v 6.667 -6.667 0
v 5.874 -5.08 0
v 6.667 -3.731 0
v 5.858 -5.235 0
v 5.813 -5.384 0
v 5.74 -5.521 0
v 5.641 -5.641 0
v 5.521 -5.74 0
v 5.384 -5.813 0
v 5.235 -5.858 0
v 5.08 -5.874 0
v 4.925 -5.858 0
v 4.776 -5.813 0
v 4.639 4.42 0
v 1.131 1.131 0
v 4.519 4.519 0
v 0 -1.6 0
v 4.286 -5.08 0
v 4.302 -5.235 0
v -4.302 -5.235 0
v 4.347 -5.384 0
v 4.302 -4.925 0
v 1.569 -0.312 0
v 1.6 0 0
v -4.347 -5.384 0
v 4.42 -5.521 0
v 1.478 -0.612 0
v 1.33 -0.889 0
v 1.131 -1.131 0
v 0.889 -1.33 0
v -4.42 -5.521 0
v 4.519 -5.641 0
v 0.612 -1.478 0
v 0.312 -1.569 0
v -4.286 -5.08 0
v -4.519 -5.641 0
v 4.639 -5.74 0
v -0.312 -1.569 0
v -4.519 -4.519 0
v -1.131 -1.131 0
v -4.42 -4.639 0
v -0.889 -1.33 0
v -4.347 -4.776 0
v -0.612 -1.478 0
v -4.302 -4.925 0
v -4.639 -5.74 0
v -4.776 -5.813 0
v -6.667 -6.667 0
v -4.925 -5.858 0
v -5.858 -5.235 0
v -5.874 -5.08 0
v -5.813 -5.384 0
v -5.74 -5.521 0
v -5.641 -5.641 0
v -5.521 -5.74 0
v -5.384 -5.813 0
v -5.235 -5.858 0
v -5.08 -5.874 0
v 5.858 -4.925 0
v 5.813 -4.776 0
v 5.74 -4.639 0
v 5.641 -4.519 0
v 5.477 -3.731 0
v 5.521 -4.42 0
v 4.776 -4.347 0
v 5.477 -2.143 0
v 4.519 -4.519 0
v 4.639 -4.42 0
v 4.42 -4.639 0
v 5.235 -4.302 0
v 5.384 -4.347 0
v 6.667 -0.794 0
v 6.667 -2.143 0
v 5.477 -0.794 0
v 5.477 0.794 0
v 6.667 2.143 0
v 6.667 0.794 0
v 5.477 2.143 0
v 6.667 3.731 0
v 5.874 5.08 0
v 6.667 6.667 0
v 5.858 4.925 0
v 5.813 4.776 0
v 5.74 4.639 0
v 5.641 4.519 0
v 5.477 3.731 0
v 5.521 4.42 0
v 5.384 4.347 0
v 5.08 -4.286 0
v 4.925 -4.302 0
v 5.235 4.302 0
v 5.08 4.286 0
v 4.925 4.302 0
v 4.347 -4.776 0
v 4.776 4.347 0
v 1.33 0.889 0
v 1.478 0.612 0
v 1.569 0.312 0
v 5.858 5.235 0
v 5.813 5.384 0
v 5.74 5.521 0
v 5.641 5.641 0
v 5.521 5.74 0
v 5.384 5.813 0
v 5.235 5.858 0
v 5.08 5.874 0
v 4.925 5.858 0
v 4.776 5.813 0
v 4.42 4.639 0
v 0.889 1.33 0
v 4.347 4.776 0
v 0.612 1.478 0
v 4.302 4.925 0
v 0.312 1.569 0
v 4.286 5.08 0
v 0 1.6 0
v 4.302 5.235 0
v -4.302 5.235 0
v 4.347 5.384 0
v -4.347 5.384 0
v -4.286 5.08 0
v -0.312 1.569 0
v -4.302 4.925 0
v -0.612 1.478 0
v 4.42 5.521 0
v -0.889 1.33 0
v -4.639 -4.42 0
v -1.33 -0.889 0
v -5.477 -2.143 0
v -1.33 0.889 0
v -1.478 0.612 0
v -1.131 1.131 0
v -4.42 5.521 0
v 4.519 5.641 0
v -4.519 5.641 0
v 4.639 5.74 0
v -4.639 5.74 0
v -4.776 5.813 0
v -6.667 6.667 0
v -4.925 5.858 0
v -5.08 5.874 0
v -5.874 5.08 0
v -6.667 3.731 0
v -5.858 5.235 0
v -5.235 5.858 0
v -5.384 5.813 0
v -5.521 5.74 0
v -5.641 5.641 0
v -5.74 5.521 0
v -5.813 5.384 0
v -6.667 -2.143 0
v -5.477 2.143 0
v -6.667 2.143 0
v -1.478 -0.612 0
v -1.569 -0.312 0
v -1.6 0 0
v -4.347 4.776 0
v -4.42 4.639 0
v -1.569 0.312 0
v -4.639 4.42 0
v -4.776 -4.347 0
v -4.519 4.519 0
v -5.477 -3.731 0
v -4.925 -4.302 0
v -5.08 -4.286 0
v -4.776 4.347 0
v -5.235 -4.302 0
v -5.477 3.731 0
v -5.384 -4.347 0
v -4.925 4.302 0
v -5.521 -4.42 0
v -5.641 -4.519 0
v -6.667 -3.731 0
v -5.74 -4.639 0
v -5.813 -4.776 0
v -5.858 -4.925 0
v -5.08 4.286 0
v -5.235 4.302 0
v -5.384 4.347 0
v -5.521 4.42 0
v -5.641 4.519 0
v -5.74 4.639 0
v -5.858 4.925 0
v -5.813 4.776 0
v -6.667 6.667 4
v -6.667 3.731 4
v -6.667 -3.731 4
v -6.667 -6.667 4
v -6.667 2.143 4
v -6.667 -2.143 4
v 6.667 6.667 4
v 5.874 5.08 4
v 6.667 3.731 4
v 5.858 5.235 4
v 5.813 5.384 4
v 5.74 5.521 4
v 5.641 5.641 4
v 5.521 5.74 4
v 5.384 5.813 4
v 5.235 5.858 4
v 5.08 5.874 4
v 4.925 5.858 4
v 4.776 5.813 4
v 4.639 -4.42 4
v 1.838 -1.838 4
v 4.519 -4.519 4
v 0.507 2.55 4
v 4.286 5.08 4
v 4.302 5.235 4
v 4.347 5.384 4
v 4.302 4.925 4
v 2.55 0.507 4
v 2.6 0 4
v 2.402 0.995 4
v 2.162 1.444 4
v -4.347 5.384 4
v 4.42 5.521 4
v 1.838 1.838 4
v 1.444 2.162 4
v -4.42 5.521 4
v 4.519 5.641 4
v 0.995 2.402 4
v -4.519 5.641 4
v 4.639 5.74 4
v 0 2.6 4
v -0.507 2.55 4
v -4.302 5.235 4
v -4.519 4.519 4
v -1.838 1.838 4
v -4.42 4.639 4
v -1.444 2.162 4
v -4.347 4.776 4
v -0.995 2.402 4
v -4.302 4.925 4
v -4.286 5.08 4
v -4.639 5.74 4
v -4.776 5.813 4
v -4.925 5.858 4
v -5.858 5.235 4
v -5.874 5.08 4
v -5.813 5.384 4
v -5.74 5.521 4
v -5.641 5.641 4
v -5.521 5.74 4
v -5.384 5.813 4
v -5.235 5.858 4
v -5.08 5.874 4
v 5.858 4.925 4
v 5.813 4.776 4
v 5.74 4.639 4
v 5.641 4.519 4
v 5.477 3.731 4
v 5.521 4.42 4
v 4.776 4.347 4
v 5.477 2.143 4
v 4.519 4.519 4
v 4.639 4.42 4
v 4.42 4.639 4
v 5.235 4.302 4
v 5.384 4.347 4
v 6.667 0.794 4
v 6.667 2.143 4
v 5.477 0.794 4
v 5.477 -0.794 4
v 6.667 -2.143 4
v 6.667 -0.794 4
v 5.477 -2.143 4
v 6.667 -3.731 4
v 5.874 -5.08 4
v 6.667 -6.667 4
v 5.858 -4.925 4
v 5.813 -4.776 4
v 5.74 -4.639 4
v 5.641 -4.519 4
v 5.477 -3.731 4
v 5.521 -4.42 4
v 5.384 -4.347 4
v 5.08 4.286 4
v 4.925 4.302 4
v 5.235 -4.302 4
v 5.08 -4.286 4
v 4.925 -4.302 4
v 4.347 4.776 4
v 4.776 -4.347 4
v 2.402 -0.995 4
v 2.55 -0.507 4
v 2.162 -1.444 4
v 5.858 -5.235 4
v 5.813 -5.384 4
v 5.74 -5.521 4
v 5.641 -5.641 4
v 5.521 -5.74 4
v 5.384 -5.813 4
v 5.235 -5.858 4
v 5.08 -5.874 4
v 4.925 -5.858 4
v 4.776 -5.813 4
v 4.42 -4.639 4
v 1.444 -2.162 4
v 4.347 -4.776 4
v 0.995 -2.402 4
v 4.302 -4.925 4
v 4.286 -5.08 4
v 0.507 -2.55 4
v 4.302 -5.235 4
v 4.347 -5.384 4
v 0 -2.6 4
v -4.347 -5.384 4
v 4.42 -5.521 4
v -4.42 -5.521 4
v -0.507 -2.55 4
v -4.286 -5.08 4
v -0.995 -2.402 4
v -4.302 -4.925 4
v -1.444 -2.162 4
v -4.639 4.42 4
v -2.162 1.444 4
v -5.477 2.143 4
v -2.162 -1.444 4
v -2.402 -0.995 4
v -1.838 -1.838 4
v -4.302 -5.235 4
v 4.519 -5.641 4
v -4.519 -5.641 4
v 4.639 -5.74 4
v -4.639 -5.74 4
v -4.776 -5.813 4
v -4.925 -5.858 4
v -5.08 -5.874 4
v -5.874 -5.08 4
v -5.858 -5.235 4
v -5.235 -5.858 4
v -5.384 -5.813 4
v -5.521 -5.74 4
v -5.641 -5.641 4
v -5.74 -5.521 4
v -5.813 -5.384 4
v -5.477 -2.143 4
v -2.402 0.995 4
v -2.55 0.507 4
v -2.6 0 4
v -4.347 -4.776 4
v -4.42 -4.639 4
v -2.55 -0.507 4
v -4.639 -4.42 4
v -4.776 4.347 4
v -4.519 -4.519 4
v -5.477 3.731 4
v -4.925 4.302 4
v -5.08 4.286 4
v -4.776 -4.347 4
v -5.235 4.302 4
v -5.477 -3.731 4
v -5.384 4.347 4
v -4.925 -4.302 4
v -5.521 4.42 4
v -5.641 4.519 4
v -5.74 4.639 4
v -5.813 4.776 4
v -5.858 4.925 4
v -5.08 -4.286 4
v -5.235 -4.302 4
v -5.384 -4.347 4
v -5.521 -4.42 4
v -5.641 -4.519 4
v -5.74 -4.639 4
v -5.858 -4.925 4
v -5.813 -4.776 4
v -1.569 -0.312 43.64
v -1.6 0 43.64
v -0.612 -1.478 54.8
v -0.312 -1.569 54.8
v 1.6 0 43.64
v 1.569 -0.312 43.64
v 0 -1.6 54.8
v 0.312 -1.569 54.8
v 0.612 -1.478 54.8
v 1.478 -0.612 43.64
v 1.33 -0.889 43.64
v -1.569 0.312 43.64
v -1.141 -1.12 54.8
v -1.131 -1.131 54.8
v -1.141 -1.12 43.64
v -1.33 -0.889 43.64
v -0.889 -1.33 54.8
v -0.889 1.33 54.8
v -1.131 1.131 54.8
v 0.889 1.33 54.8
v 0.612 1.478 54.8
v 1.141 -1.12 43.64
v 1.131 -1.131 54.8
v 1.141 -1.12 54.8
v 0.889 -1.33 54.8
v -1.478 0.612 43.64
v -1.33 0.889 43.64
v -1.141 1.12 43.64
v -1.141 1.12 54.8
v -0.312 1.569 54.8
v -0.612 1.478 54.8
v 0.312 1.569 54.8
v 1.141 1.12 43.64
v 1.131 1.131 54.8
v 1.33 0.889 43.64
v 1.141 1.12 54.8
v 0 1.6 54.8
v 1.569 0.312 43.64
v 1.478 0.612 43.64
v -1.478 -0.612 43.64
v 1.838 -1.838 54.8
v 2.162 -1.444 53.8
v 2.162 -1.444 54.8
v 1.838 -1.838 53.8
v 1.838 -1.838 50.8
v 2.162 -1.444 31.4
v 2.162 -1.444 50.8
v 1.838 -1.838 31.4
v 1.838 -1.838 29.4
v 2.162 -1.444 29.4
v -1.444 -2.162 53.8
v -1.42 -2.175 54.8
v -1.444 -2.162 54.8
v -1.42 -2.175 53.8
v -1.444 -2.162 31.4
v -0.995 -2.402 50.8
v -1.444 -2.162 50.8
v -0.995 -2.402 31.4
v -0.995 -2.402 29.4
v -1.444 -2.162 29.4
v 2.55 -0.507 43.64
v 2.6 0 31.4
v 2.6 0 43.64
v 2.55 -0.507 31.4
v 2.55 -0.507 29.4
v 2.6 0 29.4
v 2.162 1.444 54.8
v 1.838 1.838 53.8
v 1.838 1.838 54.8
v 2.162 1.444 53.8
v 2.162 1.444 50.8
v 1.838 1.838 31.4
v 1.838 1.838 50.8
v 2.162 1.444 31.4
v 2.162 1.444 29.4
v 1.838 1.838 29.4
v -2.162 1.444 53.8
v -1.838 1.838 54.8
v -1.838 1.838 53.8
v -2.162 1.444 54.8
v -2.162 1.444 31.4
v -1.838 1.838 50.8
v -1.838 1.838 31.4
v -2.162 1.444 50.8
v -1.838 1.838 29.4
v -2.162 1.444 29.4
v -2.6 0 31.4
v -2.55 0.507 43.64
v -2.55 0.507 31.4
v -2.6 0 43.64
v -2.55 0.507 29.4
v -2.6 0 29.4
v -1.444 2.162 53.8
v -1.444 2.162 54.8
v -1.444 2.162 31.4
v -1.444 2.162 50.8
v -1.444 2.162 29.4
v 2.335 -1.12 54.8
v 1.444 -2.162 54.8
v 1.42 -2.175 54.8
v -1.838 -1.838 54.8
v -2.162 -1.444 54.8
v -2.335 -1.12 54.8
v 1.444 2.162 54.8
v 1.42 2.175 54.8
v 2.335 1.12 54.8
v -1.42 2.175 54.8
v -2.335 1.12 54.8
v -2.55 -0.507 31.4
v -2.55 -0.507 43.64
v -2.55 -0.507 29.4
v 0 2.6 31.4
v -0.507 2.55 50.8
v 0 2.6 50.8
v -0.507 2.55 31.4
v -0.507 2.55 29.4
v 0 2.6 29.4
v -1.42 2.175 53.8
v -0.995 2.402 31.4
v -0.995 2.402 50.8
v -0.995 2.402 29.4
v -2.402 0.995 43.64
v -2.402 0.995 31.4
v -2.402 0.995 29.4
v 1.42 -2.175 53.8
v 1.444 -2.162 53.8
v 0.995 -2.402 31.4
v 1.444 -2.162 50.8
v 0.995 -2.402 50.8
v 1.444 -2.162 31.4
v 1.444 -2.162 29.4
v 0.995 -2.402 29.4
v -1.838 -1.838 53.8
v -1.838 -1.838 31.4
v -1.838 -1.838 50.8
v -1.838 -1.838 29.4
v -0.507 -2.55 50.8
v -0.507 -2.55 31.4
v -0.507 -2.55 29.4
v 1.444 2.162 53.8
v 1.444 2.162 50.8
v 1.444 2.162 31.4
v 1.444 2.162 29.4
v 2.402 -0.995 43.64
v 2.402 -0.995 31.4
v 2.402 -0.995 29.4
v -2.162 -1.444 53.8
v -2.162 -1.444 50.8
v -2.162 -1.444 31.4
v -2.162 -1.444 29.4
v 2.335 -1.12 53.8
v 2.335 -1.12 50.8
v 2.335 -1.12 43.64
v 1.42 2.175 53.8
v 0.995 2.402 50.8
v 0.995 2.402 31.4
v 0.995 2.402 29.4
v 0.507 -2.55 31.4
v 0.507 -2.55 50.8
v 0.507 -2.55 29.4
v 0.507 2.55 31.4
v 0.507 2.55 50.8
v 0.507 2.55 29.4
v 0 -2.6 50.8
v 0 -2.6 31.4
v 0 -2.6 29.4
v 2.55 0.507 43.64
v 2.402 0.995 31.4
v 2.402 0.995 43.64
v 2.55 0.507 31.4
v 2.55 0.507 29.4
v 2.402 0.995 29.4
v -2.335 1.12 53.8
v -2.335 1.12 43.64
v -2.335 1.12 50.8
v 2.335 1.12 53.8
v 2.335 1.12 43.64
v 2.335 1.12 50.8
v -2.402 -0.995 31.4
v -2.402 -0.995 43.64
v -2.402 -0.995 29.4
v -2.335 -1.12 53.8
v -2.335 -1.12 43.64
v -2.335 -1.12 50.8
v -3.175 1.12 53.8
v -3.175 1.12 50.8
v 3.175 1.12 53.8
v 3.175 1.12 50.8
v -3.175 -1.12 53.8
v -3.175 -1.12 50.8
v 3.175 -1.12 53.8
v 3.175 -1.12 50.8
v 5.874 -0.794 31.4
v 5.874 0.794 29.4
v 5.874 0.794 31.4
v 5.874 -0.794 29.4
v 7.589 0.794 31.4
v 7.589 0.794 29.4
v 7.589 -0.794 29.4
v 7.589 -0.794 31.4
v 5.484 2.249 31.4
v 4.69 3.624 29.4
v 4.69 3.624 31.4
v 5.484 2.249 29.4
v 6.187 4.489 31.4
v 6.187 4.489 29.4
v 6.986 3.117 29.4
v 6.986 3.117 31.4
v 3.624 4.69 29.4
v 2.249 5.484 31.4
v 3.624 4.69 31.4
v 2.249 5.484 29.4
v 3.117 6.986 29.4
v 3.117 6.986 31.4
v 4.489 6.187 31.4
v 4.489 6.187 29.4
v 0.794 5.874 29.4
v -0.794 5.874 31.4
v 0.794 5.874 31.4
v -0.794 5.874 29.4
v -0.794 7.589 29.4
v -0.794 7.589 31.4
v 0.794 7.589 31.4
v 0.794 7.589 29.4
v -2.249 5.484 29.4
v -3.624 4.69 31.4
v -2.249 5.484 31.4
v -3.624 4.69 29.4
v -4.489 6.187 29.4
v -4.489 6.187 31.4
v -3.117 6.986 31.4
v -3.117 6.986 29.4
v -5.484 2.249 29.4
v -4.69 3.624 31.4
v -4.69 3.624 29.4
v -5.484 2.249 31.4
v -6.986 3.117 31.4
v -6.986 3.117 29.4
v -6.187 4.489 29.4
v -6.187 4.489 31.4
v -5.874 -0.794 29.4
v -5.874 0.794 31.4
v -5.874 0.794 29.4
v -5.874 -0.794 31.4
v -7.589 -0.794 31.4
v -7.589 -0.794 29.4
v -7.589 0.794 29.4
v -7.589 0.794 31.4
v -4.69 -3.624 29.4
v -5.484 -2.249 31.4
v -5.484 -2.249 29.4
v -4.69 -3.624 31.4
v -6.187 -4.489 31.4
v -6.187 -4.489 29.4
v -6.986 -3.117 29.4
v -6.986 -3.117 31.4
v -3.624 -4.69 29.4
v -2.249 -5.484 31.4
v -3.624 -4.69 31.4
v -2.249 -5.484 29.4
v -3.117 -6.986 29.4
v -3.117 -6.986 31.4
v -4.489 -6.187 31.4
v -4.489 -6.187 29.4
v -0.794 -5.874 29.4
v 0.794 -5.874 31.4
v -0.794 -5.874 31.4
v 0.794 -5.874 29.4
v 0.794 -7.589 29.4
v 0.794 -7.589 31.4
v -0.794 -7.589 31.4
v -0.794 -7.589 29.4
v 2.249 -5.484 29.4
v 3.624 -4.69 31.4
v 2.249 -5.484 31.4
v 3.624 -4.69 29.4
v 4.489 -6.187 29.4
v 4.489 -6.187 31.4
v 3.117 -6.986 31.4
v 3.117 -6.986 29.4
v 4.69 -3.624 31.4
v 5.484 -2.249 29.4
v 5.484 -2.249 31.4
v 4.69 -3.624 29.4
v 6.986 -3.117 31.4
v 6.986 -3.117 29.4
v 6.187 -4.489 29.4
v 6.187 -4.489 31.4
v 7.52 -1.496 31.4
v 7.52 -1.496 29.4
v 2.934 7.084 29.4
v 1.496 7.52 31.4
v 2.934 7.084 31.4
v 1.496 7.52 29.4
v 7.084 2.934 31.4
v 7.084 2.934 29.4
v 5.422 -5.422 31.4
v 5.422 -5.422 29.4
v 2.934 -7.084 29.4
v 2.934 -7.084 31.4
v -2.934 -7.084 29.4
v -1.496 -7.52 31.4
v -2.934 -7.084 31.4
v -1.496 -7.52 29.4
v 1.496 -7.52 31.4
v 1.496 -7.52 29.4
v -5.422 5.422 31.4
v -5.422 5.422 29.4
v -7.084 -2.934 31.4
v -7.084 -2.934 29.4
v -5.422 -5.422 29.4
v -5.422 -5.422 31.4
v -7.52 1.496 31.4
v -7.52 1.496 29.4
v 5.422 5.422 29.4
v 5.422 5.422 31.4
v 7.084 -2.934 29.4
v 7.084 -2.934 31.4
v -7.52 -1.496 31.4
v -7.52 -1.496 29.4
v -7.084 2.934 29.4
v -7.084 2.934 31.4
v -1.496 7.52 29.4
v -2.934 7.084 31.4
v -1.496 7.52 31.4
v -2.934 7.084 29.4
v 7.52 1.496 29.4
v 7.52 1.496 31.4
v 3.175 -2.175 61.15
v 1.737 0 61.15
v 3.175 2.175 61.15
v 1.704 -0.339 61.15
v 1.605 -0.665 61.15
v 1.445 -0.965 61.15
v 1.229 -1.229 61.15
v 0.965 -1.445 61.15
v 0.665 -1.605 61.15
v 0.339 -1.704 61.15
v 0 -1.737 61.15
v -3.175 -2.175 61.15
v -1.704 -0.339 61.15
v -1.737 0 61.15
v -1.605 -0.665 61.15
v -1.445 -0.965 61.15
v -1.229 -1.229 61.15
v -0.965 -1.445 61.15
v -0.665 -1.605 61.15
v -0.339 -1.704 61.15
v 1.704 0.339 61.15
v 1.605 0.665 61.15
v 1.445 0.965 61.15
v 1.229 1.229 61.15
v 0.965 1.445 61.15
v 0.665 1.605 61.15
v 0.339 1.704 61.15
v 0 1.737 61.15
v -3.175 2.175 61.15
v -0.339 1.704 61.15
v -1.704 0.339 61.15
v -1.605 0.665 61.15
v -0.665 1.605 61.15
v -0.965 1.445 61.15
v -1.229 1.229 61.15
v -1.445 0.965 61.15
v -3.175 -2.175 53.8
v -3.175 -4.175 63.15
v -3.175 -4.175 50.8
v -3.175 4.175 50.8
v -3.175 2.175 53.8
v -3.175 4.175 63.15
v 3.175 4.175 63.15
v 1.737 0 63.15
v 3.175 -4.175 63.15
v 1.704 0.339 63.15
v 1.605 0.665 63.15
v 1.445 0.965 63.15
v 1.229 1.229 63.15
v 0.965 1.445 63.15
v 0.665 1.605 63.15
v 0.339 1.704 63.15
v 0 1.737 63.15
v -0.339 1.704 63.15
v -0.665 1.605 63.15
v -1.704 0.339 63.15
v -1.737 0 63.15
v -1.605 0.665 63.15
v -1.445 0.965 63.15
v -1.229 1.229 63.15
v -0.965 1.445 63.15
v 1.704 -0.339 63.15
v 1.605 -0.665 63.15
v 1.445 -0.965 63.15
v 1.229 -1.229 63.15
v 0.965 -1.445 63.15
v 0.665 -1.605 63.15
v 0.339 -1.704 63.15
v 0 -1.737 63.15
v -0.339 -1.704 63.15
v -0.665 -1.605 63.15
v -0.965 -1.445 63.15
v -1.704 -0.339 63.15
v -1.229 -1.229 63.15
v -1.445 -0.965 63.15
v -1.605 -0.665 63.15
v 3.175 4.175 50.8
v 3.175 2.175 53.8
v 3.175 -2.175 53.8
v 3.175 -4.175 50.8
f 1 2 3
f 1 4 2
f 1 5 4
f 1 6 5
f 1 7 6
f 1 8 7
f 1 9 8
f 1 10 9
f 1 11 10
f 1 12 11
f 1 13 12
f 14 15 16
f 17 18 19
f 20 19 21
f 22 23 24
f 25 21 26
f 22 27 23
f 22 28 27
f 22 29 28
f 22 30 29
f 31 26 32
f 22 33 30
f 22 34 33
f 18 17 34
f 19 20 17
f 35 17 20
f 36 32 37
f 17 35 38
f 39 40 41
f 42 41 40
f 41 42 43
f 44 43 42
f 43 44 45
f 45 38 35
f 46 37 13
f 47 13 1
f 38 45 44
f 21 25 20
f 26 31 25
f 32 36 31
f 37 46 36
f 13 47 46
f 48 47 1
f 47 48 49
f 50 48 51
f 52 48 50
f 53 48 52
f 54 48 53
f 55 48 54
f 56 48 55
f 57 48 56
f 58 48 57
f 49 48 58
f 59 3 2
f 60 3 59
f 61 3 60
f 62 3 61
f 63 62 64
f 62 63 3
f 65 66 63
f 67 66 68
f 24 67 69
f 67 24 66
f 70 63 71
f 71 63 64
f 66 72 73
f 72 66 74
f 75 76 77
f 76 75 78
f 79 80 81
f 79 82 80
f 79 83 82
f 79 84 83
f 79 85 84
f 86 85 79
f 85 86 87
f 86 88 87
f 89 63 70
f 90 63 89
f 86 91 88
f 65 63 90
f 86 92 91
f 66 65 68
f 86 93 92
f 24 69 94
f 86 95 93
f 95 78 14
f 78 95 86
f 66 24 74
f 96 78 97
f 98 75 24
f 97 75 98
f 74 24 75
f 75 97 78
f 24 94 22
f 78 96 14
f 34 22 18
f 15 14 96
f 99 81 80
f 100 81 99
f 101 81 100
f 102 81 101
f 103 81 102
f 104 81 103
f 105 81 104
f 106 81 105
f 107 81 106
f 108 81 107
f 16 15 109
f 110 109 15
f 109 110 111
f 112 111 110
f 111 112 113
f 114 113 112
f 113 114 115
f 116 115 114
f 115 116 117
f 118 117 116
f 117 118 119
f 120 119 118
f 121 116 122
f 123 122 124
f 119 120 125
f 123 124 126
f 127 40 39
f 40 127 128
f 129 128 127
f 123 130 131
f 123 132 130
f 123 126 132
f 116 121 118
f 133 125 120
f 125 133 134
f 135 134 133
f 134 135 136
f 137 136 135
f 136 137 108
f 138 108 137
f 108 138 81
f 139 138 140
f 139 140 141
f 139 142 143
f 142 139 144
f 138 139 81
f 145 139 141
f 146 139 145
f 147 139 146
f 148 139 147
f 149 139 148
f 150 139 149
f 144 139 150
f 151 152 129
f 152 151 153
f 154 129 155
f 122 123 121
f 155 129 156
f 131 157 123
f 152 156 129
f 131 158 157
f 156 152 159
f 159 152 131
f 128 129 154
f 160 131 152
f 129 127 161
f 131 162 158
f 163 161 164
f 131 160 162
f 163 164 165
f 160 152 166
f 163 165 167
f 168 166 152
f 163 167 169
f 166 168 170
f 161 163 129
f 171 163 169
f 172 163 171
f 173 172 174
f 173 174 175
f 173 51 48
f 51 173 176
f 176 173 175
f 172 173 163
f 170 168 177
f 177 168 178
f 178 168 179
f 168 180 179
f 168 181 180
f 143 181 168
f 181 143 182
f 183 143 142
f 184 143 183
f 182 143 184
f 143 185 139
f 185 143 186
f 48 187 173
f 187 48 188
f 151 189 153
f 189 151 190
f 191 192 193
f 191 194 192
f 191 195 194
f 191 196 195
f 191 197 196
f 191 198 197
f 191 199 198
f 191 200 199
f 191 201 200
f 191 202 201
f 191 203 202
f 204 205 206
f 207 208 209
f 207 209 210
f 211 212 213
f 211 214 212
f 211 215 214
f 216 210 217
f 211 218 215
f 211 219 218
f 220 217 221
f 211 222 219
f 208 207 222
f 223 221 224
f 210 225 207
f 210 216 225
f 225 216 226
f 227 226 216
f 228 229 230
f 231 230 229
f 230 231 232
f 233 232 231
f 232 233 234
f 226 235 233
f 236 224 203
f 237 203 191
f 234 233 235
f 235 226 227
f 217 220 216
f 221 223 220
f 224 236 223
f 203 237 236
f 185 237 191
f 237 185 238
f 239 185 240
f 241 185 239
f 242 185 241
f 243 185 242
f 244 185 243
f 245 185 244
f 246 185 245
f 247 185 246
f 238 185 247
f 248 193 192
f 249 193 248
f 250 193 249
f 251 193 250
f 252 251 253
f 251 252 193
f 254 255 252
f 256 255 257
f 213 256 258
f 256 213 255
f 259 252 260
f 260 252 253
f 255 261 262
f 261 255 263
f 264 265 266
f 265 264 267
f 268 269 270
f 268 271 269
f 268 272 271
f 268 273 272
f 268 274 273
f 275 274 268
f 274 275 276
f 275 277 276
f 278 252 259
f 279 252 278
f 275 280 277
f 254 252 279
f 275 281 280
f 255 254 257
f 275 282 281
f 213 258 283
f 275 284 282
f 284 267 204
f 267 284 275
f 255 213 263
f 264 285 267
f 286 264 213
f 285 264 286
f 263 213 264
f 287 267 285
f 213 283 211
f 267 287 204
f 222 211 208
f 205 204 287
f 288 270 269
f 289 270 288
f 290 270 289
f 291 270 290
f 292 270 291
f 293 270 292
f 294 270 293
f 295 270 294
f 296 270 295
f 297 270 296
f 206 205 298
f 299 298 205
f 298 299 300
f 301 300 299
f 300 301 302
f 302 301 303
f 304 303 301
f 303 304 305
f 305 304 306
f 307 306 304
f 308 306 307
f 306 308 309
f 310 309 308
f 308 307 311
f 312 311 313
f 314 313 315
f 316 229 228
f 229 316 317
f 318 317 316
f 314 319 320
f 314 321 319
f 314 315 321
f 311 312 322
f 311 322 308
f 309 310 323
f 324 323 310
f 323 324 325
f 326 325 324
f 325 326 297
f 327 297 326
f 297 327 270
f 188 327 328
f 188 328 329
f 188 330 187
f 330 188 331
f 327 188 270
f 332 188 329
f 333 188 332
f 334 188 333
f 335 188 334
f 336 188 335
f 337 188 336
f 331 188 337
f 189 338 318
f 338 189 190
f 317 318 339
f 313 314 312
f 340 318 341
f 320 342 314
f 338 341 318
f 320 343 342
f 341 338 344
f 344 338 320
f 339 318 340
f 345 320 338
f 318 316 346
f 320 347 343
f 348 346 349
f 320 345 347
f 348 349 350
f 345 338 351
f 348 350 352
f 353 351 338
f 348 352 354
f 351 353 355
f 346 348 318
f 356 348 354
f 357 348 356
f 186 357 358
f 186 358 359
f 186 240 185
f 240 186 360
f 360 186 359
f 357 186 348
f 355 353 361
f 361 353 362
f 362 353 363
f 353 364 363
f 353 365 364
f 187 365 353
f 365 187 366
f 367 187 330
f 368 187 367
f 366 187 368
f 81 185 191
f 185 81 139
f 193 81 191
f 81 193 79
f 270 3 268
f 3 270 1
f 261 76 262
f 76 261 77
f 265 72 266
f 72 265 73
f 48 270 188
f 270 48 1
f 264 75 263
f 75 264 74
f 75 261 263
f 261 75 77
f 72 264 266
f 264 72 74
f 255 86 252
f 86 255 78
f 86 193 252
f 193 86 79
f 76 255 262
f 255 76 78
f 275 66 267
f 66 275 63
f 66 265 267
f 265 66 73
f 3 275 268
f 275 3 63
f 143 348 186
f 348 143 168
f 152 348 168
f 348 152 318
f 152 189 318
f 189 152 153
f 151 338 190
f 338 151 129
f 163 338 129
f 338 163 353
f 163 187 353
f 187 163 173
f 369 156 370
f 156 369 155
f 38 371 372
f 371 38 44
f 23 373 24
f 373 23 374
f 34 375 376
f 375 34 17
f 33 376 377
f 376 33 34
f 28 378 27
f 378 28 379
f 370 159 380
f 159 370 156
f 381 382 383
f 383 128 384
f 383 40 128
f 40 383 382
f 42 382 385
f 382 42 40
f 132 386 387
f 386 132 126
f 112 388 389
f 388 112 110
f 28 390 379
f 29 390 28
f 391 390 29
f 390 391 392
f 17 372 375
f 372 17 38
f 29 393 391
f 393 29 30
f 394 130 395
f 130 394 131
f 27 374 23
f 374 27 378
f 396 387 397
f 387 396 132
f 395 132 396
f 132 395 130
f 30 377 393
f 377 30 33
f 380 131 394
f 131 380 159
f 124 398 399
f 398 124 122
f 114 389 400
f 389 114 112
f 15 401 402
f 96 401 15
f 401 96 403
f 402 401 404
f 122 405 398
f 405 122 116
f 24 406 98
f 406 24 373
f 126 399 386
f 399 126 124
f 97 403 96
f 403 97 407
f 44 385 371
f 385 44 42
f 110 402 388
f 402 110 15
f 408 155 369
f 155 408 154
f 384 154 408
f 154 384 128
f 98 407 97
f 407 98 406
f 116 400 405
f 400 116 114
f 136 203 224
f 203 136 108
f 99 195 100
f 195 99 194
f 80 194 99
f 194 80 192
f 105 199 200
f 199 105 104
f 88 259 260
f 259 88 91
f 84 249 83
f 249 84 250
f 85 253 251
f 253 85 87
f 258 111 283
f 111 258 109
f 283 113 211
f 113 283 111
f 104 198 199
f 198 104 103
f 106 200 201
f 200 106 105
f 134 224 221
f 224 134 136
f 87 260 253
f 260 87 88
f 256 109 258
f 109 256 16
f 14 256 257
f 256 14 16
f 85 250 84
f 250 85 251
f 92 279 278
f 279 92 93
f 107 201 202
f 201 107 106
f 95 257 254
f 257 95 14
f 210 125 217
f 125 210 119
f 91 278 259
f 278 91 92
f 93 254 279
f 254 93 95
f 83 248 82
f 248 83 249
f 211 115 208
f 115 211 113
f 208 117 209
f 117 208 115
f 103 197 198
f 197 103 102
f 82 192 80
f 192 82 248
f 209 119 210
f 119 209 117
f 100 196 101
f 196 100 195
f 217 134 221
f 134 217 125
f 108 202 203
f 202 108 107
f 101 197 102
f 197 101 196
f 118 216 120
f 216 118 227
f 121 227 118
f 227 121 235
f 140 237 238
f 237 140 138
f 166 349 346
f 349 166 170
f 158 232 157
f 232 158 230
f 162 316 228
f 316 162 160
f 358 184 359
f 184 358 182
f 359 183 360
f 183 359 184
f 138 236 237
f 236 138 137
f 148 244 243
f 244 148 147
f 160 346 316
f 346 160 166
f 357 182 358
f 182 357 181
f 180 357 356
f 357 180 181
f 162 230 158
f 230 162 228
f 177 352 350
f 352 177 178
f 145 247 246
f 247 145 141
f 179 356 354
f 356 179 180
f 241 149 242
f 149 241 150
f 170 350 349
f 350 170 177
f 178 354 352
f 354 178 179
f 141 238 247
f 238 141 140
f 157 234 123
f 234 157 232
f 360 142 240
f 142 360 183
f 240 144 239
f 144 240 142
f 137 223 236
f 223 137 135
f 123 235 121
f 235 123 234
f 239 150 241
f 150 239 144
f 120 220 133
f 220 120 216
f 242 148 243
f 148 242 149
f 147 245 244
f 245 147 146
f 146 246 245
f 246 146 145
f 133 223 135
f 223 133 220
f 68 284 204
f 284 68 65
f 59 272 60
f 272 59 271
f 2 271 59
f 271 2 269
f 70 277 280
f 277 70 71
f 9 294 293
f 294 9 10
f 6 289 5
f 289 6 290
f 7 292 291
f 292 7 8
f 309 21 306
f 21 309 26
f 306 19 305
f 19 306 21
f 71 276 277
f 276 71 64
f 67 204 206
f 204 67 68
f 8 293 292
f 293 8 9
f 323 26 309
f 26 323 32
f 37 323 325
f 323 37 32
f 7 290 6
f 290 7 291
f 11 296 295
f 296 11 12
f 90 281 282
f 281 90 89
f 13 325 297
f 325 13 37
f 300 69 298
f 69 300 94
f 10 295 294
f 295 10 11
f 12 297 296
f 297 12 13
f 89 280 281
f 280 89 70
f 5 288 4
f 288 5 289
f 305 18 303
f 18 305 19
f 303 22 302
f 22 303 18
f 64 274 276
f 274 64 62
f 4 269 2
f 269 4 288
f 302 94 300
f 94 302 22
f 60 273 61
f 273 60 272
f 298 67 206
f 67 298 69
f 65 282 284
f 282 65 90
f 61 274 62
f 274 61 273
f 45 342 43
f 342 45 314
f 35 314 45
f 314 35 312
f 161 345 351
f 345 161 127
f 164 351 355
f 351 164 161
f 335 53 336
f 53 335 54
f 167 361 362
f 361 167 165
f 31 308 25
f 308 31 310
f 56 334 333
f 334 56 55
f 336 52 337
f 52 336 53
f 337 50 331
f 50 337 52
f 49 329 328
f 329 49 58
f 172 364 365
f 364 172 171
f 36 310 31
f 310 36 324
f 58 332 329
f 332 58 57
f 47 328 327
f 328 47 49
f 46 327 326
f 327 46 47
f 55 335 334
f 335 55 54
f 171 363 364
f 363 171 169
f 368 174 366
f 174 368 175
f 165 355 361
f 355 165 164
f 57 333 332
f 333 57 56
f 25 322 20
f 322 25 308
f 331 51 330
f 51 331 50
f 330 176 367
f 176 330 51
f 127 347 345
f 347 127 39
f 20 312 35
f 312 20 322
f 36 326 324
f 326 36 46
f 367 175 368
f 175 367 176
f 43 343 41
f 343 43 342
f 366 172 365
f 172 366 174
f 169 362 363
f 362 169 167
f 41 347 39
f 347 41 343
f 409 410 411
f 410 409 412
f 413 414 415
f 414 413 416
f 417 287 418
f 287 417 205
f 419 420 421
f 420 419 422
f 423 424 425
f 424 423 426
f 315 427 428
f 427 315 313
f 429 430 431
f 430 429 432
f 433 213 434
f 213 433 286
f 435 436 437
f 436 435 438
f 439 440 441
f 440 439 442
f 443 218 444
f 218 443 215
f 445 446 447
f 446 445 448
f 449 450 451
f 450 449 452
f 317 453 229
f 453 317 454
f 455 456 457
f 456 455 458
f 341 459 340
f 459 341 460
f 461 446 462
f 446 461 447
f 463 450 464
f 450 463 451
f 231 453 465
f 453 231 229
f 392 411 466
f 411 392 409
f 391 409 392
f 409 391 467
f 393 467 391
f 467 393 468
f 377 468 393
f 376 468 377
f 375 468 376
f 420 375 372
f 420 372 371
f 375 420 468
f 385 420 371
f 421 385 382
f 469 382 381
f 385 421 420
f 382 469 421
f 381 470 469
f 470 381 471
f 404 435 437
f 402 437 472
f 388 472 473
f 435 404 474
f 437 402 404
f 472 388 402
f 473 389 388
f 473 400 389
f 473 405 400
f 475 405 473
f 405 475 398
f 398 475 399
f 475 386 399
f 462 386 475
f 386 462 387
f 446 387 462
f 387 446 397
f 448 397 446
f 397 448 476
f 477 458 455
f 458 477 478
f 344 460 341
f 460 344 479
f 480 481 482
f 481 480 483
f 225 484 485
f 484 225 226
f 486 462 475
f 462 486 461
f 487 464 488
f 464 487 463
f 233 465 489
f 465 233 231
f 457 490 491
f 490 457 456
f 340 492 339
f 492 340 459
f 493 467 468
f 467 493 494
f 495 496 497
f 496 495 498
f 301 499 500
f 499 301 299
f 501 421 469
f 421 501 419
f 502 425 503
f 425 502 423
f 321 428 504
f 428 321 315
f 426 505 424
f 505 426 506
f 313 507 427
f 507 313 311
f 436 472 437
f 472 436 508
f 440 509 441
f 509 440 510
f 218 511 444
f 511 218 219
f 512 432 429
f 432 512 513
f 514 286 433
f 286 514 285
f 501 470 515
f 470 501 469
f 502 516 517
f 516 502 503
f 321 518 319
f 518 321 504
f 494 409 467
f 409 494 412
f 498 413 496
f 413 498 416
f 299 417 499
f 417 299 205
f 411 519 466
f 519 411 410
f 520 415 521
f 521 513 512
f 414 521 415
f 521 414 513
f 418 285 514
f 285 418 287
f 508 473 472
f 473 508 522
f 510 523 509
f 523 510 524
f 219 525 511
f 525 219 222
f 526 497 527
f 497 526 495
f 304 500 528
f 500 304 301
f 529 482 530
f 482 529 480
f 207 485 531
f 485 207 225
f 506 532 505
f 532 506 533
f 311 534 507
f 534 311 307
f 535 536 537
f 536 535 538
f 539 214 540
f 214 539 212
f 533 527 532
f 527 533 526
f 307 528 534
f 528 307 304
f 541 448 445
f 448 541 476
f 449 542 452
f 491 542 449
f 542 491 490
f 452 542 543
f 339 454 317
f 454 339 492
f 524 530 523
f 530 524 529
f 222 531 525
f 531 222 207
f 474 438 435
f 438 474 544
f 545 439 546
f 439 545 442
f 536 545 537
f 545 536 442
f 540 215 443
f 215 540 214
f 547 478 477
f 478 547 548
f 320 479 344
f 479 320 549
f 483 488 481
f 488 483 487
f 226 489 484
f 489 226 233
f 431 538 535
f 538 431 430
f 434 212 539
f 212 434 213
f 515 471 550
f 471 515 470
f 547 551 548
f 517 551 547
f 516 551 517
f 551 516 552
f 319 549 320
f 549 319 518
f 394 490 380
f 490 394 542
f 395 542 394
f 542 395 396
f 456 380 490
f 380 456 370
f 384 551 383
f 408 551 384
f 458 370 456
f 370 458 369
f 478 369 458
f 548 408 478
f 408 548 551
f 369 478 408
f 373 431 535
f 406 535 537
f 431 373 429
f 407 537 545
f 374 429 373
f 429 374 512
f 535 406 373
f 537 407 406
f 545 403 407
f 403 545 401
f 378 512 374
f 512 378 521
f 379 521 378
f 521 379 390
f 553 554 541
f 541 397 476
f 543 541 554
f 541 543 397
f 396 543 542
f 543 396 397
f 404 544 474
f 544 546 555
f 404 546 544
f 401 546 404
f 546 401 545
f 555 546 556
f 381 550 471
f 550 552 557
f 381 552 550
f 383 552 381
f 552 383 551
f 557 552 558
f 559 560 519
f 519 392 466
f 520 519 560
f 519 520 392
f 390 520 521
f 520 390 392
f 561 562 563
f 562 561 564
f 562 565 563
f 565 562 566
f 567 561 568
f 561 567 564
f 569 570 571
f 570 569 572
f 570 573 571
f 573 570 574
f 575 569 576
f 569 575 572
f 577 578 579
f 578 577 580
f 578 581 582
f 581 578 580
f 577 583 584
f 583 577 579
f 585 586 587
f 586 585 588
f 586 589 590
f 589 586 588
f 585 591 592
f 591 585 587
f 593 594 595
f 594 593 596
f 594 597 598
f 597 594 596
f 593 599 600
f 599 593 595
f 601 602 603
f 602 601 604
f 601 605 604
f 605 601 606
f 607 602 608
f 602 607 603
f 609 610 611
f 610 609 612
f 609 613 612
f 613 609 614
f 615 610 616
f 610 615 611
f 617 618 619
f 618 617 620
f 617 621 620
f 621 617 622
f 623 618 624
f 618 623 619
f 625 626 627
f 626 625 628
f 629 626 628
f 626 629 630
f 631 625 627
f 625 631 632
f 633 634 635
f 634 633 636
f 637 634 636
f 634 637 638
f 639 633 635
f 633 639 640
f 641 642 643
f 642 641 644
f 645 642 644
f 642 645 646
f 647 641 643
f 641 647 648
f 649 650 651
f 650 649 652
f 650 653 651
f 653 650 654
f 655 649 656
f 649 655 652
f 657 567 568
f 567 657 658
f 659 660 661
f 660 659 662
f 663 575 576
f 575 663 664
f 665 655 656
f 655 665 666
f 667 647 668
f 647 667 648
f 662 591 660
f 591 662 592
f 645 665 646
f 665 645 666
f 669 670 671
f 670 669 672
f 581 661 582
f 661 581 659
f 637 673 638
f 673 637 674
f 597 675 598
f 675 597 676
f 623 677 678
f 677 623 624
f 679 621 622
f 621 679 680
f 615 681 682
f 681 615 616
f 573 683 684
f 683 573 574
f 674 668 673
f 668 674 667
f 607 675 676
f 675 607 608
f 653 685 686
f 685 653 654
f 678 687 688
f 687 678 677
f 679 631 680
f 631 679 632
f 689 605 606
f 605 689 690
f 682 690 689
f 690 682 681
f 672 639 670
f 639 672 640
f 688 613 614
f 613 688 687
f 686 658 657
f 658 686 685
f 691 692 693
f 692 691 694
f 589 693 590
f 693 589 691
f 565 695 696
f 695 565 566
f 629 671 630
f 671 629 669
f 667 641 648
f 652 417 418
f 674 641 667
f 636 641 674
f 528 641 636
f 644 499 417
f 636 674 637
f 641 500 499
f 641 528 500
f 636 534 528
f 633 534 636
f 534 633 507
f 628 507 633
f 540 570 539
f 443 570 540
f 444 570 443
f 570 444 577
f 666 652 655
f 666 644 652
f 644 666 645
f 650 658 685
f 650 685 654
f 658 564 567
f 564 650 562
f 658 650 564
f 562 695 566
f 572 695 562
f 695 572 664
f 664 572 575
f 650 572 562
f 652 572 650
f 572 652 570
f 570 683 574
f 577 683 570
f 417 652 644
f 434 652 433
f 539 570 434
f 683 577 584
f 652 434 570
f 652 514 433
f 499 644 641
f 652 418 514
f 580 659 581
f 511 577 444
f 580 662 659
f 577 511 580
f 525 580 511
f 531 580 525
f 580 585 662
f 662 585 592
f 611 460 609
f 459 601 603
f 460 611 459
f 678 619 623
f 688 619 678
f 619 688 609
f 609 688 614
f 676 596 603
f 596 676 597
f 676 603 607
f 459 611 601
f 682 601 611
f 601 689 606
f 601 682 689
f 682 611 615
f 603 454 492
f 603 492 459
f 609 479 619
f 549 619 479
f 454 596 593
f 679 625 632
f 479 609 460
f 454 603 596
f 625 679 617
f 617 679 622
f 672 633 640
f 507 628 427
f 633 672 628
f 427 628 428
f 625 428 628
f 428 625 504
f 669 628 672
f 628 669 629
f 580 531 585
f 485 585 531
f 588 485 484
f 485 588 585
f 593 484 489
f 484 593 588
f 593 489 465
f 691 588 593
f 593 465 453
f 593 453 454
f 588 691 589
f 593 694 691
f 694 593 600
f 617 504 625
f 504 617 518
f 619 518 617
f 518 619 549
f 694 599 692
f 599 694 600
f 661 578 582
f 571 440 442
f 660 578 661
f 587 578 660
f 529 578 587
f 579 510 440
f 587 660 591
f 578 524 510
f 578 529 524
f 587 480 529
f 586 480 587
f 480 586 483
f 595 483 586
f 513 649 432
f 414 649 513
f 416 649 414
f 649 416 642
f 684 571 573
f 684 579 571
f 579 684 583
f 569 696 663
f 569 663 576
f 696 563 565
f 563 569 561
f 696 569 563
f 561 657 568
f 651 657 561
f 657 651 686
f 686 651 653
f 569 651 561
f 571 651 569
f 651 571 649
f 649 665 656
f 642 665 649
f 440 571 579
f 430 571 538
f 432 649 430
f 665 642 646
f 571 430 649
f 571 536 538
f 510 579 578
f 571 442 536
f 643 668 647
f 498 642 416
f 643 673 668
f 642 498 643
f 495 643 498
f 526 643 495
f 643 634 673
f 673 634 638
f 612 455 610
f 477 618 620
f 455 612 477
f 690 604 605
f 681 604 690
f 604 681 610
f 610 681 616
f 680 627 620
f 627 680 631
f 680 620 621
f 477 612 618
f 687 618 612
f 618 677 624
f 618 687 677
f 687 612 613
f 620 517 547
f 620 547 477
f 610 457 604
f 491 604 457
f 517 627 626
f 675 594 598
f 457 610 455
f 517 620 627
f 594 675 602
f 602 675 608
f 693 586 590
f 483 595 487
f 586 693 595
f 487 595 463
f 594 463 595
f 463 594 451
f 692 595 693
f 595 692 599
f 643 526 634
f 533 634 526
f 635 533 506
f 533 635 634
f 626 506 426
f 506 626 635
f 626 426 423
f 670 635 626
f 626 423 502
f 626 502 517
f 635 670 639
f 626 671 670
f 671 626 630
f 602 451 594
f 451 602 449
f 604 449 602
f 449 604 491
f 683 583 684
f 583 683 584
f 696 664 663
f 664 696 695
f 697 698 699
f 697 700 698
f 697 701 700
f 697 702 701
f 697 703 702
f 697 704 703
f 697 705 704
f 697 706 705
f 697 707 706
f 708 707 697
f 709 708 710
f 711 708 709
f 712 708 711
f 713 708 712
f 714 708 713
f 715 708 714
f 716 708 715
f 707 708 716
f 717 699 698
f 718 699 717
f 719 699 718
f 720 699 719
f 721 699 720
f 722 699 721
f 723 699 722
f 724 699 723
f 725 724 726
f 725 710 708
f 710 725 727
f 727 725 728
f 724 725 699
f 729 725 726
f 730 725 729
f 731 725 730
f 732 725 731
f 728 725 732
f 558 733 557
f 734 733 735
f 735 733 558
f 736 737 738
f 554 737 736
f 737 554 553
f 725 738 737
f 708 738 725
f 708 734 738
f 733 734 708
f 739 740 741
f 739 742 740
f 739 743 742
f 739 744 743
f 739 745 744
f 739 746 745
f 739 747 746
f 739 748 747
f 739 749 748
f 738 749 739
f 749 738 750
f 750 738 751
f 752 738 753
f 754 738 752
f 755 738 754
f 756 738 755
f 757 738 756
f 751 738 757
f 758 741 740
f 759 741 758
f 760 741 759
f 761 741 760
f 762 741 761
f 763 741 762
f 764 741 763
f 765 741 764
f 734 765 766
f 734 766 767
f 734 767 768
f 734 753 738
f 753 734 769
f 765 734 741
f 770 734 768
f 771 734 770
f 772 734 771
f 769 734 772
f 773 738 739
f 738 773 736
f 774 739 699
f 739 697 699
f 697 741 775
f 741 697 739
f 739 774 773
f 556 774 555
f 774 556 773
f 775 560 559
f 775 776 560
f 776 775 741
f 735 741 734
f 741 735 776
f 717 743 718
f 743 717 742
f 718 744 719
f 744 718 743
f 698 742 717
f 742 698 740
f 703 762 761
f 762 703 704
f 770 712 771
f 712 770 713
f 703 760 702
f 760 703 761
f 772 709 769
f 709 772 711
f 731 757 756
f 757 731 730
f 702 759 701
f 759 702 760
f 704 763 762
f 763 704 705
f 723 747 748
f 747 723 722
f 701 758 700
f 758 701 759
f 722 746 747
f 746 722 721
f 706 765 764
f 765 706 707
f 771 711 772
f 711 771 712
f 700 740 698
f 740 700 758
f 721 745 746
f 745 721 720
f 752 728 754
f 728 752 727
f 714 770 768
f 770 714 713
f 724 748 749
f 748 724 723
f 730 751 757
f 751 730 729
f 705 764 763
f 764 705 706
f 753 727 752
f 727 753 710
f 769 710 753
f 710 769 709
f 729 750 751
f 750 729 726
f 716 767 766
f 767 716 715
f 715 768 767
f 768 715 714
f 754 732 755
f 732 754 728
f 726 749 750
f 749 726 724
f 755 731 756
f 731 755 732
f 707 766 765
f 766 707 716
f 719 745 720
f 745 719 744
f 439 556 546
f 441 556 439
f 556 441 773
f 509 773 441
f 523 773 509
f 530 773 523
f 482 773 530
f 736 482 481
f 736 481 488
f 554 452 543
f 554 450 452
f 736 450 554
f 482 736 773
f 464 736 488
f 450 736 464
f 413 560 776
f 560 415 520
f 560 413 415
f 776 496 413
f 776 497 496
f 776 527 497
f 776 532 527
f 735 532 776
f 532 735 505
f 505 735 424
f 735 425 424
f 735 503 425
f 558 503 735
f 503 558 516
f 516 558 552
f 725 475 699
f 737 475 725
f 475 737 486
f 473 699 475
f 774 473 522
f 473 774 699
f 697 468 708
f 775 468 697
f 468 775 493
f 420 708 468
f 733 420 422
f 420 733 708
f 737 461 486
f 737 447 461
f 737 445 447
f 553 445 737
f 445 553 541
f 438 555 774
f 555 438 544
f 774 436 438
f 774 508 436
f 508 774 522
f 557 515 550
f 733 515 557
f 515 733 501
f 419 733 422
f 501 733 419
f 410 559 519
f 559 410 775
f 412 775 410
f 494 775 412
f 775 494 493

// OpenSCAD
// coil form
//
// (inductance to be determined)
//

$sd = 3.2; // 2.8mm slug diameter plus clearance
$sl = 25.4; // 25.4mm (1 inch) slug length
$th = 2;    // 2mm wall thickness
$bh = 4;    // 4mm base height

$nn = 25.4 / 16; // 1/16 inch notches
$bw = 25.4 * 4 / 10 + $nn;  // 4/10 inch square base for mount holes (add twice notch size for actual base size)
$dr = $nn; // 1/16 drill radius for mount hole


// yoke/canopy dimensions
$xd = 25.4 / 8 + 0.3; // diameter for adjust screw hole
$xc = 25.4 / 4; // clearance above tube for adjust thingy
$xw = 25.4 / 4; // width of adjust thingy
$xl = 25.4 / 4; // length of adjust thingy
$xh = 2;        // thickness of adjust thingy


$fn=32; // num frames in shape (global)

color("red") // base
  difference()
  {
    linear_extrude(height=$bh) // square base
      square($bw+$nn,center=true);
    
    translate([$bw/2 + $nn/4, 0, -1]) // notches
      linear_extrude(height=$bh + 2)
        square($nn, center=true);

    translate([$bw/2 + $nn/4, $bw/4, -1])
      linear_extrude(height=$bh + 2)
        square($nn, center=true);

    translate([$bw/2 + $nn/4, -$bw/4, -1])
      linear_extrude(height=$bh + 2)
        square($nn, center=true);

    translate([-$bw/2 - $nn/4, $bw/4, -1])
      linear_extrude(height=$bh + 2)
        square($nn, center=true);

    translate([-$bw/2 - $nn/4, -$bw/4, -1])
      linear_extrude(height=$bh + 2)
        square($nn, center=true);

    translate([0,0,-1])
      linear_extrude(height=$bh + 2)
        circle(d=$sd);

    translate([$bw/2-$nn/2,$bw/2-$nn/2,-1])
      linear_extrude(height=$bh + 2)
        circle(d=$dr);
    translate([-($bw/2-$nn/2),$bw/2-$nn/2,-1])
      linear_extrude(height=$bh + 2)
        circle(d=$dr);
    translate([$bw/2-$nn/2,-($bw/2-$nn/2),-1])
      linear_extrude(height=$bh + 2)
        circle(d=$dr);
    translate([-($bw/2-$nn/2),-($bw/2-$nn/2),-1])
      linear_extrude(height=$bh + 2)
        circle(d=$dr);
  }

color("orange")
  translate([0,0,$bh-1])
    difference()
    {
      linear_extrude(height=2*$sl+1)
        circle(d=$sd+$th);

      translate([0,0,-1])
        linear_extrude(height=2*$sl+3)
          circle(d=$sd);
      
      translate([0,0,1.6*$sl])
        linear_extrude(height=0.4*$sl+3)
          square([$sd*1.5+$th,$sd*0.7], true);
    }

color("red")   // limit of slug motion
  translate([0,0,$sl+$bh])
    difference()
    {
      linear_extrude(height=$th)
        circle(d=$bw+$th+$nn);

      translate([0,0,-1])
        linear_extrude(height=$th+2)
          circle(d=$sd);

      for(ww=[0:30:359])
      {
        rotate([0,0,ww])
          translate([$bw/2 + $nn, 0, -1]) // notches
            linear_extrude(height=$bh + 2)
              square([2*$nn,$nn], center=true);
      }
        
    }

color("green")   // yoke/canopy thingy for adjustments
  translate([0,0,2*$sl+$bh])
    union()
    {
      translate([0,0,$xc])
        difference()
        {
          linear_extrude(height=$xh)
            square([$xw, $xl+$th], center=true);
          translate([0,0,-1])
            linear_extrude(height=$xh+2)
              circle(d=$xd);
        }

      translate([0,0,-$bh])
        difference()
        {
          union()
          {
            translate([0,$xl/2,0])
              linear_extrude(height=$bh+$xc+$xh)
                square([$xw,$th],center=true);
            translate([0,-$xl/2,0])
              linear_extrude(height=$bh+$xc+$xh)
                square([$xw,$th],center=true);
            linear_extrude(height=$bh-1)
                square([$xw,$xw],center=true);
          }
          translate([0,0,-1])
            linear_extrude(height=$bh+$xc+$xh)
              circle(d=$sd+$th/4);

          translate([0,0,-1])
            linear_extrude(height=0.2*$sl+3)
              square([$sd*1.5+$th,$sd*0.7], true);
        }
    }
    
    
